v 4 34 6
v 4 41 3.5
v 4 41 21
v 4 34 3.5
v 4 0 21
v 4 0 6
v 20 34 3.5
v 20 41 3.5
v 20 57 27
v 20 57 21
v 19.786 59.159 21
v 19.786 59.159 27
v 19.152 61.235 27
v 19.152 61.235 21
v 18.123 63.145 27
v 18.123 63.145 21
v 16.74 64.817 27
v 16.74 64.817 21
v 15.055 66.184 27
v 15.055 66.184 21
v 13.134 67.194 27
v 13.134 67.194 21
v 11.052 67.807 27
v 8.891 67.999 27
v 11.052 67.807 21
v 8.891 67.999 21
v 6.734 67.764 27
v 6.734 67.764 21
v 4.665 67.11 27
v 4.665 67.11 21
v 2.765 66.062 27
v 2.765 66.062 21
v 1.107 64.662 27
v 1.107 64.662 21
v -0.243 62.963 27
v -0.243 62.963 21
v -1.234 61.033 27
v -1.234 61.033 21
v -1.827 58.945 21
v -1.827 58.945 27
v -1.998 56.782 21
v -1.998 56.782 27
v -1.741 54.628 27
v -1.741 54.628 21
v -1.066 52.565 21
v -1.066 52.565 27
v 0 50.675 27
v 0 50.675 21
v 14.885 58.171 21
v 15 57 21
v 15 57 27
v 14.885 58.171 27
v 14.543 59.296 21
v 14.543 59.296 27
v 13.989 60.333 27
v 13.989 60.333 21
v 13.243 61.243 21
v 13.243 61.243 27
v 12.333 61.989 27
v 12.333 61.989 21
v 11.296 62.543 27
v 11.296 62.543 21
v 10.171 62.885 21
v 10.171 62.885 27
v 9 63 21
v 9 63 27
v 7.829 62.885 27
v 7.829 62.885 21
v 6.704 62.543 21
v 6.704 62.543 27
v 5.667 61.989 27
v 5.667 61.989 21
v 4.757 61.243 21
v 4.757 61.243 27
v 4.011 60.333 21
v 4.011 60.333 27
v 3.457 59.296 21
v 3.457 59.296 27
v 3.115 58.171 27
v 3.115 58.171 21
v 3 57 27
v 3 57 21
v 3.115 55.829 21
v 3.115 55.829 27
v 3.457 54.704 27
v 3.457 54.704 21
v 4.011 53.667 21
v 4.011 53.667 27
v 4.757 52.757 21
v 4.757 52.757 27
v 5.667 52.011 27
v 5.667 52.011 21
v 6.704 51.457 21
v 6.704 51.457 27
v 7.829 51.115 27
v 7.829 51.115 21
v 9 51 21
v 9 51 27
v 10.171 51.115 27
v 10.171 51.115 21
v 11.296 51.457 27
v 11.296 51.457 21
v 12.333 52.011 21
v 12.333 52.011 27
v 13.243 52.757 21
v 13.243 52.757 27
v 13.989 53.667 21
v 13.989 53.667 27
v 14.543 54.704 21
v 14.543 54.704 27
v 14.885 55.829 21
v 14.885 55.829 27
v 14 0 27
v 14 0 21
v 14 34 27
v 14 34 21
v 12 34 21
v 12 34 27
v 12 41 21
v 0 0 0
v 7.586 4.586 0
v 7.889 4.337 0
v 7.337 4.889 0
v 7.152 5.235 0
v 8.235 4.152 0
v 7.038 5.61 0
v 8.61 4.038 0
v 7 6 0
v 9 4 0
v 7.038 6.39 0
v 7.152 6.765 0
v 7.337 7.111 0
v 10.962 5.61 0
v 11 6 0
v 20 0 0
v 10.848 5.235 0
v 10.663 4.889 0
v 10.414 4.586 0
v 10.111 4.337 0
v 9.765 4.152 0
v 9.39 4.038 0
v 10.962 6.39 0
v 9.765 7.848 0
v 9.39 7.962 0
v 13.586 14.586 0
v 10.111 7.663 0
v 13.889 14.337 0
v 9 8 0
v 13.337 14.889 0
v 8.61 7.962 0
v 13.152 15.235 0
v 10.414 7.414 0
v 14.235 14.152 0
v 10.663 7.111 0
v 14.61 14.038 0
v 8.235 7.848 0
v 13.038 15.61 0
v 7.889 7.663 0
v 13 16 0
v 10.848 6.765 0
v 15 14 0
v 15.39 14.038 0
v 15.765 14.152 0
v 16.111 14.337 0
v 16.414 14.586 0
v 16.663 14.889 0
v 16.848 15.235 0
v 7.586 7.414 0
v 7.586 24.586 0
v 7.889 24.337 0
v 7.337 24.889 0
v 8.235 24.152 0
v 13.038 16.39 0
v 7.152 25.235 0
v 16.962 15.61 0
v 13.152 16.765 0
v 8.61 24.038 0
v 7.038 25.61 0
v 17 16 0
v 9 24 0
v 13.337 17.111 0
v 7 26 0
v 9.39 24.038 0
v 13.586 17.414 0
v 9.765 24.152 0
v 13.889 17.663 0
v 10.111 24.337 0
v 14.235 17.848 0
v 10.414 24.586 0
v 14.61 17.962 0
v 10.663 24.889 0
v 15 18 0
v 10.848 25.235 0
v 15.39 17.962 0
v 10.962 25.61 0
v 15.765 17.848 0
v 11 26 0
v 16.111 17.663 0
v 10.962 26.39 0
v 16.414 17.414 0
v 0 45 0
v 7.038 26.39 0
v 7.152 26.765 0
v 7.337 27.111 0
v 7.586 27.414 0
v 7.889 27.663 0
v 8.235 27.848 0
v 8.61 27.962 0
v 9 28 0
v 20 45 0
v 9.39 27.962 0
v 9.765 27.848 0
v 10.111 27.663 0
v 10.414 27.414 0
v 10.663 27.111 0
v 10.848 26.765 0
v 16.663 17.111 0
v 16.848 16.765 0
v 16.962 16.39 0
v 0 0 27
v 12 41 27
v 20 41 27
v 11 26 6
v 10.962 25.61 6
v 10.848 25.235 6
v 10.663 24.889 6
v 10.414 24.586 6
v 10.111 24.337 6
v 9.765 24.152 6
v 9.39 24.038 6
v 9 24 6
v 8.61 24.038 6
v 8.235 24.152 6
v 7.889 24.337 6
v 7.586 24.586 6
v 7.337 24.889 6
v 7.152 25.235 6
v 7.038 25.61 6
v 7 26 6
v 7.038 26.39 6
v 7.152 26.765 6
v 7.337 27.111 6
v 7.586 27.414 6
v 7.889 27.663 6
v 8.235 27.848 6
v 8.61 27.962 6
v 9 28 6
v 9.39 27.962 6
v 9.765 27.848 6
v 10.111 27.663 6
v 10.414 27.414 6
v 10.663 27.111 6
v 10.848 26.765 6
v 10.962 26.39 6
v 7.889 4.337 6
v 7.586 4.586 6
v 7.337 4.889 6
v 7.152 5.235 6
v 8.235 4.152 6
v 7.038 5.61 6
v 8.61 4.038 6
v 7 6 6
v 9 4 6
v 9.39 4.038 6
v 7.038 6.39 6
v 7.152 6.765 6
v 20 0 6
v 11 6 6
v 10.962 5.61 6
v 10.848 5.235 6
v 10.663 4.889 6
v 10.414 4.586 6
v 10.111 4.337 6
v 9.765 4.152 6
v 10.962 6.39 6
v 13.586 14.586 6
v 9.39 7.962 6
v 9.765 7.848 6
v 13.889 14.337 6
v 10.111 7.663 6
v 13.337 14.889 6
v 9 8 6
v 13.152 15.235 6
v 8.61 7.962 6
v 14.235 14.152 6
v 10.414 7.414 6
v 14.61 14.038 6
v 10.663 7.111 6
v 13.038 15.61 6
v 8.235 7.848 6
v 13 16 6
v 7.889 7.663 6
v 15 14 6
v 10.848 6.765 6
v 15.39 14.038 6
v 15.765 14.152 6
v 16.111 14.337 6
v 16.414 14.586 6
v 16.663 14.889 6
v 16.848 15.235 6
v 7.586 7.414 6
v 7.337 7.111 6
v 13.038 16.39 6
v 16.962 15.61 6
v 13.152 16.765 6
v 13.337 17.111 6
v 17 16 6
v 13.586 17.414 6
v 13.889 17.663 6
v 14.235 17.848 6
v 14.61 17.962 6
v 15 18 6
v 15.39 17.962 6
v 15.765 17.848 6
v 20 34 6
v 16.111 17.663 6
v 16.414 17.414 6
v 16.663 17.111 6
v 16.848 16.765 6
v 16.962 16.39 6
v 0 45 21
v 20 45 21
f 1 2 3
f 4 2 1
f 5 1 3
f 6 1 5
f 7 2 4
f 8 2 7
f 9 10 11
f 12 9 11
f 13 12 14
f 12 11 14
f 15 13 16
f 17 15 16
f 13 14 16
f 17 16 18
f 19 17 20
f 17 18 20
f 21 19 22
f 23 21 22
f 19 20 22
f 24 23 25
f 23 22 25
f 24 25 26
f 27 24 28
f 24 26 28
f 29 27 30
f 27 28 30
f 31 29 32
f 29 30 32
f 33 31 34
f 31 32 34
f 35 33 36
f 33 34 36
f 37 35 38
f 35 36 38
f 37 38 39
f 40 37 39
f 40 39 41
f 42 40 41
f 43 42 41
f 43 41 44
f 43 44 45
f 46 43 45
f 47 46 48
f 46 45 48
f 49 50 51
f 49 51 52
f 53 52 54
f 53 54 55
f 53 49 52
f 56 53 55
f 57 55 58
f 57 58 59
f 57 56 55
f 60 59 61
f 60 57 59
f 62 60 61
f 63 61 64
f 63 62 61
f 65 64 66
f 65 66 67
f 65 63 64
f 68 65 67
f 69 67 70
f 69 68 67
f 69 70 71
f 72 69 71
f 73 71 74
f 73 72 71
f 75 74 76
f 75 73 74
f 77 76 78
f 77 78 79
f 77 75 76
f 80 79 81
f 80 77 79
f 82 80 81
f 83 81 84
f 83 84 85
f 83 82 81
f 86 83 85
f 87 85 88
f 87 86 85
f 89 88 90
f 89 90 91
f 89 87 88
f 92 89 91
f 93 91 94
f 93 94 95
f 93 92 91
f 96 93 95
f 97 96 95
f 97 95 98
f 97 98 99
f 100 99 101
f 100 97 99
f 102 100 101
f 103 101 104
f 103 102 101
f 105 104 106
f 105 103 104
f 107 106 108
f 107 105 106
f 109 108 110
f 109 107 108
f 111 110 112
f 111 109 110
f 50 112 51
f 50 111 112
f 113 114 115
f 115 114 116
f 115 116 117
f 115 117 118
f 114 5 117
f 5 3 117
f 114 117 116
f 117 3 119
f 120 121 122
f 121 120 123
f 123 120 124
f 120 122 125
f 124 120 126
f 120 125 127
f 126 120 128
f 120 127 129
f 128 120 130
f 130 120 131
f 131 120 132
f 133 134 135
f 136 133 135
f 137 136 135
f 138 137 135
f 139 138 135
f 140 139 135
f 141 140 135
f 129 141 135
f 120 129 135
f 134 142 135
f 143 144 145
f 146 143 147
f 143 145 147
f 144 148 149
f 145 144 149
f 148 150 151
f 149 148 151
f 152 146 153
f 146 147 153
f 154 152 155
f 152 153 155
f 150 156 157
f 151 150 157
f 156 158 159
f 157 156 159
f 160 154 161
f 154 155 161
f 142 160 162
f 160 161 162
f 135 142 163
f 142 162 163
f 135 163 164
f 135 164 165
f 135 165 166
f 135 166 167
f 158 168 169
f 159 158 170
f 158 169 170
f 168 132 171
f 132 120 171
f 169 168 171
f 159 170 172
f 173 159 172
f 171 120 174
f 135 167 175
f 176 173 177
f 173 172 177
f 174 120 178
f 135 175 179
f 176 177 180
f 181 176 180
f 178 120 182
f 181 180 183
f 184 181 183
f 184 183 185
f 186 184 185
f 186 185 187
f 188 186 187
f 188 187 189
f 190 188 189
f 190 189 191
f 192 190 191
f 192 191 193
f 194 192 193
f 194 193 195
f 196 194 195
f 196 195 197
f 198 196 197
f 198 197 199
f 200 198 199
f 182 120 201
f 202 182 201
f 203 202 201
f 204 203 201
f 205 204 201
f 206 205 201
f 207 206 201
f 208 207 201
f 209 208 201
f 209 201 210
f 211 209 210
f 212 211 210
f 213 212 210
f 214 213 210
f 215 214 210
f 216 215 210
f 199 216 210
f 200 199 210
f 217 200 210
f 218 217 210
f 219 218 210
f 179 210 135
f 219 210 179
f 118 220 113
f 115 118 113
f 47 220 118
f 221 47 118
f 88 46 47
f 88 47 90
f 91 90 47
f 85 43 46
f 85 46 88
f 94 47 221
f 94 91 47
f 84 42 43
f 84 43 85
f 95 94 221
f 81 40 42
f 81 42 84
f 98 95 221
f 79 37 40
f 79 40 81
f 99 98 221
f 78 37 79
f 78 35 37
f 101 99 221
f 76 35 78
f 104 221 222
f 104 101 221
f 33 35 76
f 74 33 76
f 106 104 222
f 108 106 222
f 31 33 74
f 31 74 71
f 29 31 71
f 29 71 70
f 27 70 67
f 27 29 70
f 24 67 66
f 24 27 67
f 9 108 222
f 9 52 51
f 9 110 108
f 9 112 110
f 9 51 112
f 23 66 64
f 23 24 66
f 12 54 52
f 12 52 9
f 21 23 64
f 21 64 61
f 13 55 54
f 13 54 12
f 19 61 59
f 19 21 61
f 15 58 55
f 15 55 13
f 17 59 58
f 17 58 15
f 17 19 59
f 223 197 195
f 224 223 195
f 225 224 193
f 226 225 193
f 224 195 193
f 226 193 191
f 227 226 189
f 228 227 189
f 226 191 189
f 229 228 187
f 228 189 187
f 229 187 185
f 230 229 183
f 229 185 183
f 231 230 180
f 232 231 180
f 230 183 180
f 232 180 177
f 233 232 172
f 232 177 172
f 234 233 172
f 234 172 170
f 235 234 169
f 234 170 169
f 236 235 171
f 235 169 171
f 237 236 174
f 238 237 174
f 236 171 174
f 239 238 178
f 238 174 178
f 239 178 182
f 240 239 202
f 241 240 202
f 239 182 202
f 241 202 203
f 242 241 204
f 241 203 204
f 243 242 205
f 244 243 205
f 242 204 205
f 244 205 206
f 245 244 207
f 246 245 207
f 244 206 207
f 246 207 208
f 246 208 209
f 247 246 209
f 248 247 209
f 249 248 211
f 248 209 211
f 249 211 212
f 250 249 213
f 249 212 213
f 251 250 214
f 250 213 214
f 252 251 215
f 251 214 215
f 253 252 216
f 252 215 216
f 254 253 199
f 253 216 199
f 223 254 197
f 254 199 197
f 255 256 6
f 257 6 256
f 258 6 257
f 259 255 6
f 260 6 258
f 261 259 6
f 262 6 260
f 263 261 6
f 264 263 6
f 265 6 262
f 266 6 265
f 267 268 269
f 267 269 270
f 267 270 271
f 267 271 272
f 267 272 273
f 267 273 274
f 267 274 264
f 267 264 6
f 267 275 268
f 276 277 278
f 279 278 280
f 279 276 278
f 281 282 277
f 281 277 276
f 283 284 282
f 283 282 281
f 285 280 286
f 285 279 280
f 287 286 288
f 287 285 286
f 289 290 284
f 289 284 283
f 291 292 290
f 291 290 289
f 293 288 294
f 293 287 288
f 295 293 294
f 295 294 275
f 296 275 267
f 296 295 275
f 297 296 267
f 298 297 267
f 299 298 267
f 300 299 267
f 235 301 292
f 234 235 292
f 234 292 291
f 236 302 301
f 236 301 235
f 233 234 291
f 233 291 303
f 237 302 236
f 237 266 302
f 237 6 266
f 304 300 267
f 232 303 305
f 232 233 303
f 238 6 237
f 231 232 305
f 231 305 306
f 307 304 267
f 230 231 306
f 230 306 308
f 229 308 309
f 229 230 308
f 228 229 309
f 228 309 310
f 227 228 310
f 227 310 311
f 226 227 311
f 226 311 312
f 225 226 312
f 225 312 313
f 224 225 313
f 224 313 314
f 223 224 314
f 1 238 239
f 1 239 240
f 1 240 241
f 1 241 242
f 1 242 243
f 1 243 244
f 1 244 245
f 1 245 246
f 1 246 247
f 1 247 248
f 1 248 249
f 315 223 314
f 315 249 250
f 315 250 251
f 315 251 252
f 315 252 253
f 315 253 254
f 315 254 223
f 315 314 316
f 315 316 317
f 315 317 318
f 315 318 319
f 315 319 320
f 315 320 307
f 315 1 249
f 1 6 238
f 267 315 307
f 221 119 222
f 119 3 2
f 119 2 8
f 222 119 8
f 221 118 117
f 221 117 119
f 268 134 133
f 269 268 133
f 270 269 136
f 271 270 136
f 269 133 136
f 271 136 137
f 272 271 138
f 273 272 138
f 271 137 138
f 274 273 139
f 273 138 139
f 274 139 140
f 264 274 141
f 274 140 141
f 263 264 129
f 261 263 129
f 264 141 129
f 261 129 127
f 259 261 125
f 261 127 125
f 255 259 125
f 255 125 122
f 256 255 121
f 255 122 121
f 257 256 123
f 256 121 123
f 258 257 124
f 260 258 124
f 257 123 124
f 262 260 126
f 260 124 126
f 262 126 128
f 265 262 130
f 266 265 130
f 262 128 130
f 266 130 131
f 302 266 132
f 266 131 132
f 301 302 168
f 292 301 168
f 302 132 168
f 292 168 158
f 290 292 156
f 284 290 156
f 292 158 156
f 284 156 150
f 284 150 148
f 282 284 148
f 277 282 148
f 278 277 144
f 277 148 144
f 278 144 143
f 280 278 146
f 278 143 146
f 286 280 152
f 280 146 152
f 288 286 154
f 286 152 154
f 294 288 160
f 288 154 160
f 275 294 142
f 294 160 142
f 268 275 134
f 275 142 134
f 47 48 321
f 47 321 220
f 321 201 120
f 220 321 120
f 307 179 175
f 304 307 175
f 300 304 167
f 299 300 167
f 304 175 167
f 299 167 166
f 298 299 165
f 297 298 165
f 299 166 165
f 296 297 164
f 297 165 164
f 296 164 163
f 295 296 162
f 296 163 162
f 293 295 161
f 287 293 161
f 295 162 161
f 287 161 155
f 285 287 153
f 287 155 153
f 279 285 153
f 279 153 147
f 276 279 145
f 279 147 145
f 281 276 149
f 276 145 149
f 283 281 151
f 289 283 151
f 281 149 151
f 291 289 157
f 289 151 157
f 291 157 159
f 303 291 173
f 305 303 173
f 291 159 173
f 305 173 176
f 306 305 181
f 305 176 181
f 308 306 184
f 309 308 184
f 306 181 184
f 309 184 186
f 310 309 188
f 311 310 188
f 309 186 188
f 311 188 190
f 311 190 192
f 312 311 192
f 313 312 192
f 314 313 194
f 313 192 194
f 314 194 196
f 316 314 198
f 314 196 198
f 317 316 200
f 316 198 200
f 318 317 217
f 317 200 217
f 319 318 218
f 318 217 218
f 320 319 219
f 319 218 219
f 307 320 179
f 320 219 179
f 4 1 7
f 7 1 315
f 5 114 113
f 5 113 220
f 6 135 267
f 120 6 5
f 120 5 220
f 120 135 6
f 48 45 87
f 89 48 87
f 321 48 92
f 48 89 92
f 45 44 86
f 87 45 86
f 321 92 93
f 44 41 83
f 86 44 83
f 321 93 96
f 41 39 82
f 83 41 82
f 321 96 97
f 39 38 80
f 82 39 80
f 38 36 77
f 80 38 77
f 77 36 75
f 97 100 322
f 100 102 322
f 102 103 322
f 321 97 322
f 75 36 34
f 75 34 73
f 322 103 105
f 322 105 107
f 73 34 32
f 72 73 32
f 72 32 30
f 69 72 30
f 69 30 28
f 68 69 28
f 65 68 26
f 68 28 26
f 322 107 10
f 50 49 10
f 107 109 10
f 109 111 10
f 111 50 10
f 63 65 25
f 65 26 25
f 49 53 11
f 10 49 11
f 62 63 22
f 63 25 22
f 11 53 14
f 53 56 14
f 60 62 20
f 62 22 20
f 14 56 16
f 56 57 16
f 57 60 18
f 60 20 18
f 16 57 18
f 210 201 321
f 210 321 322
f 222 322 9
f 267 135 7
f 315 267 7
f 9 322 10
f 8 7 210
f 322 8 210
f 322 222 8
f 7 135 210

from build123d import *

# Parameters (mm, degrees)
SKETCH_W        = 20
SKETCH_H        = 45
PAD_DEPTH       = 6
PAD001_DEPTH    = 15
SKETCH002_R     = 6
PAD002_DEPTH    = 6
SKETCH003_R     = 2
POCKET_DEPTH    = 6
SKETCH004_W     = 7
SKETCH004_H     = 6
POCKET001_DEPTH = 2
SKETCH005_W     = 16
SKETCH005_H     = 7
POCKET002_DEPTH = 2.5


with BuildPart() as part:
    # Sketch → Pad (new body)
    with BuildSketch(Plane.XY):
        with Locations((10, 22.5)):
            Rectangle(SKETCH_W, SKETCH_H)
    extrude(amount=PAD_DEPTH)

    # Sketch001 (on Face6 of Pad) → Pad001 (join)
    with BuildSketch(Plane.XY.offset(6)):
        Polygon((0, 0), (0, 45), (20, 45), (20, 41), (4, 41), (4, 0), align=None)
    extrude(amount=PAD001_DEPTH)

    # Sketch002 (on Face11 of Pad001) → Pad002 (join)
    with BuildSketch(Plane.XY.offset(21)):
        with BuildLine():
            Line((14, 0), (14, 41))
            Line((14, 41), (20, 41))
            Line((20, 41), (20, 57))
            ThreePointArc((20, 57), (5.683375, 67.488088), (0, 50.675445))
            Line((0, 50.675445), (0, 0))
            Line((14, 0), (0, 0))
        make_face()
        with Locations((9, 57)):
            Circle(SKETCH002_R, mode=Mode.SUBTRACT)
    extrude(amount=PAD002_DEPTH)

    # Sketch003 (on Face4 of Pad002) → Pocket (cut)
    with BuildSketch(Plane(origin=(0, 0, 0), x_dir=(1, 0, 0), z_dir=(0, 0, -1))):
        with Locations((9, -6)):
            Circle(SKETCH003_R)
        with Locations((9, -26)):
            Circle(SKETCH003_R)
        with Locations((15, -16)):
            Circle(SKETCH003_R)
    extrude(amount=-POCKET_DEPTH, mode=Mode.SUBTRACT)

    # Sketch004 (on Face20 of Pocket) → Pocket001 (cut)
    with BuildSketch(Plane.YZ.offset(14)):
        with Locations((37.5, 24)):
            Rectangle(SKETCH004_W, SKETCH004_H)
    extrude(amount=-POCKET001_DEPTH, mode=Mode.SUBTRACT)

    # Sketch005 (on Face6 of Pocket001) → Pocket002 (cut)
    with BuildSketch(Plane.XY.offset(6)):
        with Locations((12, 37.5)):
            Rectangle(SKETCH005_W, SKETCH005_H)
    extrude(amount=-POCKET002_DEPTH, mode=Mode.SUBTRACT)


solid = part.part
